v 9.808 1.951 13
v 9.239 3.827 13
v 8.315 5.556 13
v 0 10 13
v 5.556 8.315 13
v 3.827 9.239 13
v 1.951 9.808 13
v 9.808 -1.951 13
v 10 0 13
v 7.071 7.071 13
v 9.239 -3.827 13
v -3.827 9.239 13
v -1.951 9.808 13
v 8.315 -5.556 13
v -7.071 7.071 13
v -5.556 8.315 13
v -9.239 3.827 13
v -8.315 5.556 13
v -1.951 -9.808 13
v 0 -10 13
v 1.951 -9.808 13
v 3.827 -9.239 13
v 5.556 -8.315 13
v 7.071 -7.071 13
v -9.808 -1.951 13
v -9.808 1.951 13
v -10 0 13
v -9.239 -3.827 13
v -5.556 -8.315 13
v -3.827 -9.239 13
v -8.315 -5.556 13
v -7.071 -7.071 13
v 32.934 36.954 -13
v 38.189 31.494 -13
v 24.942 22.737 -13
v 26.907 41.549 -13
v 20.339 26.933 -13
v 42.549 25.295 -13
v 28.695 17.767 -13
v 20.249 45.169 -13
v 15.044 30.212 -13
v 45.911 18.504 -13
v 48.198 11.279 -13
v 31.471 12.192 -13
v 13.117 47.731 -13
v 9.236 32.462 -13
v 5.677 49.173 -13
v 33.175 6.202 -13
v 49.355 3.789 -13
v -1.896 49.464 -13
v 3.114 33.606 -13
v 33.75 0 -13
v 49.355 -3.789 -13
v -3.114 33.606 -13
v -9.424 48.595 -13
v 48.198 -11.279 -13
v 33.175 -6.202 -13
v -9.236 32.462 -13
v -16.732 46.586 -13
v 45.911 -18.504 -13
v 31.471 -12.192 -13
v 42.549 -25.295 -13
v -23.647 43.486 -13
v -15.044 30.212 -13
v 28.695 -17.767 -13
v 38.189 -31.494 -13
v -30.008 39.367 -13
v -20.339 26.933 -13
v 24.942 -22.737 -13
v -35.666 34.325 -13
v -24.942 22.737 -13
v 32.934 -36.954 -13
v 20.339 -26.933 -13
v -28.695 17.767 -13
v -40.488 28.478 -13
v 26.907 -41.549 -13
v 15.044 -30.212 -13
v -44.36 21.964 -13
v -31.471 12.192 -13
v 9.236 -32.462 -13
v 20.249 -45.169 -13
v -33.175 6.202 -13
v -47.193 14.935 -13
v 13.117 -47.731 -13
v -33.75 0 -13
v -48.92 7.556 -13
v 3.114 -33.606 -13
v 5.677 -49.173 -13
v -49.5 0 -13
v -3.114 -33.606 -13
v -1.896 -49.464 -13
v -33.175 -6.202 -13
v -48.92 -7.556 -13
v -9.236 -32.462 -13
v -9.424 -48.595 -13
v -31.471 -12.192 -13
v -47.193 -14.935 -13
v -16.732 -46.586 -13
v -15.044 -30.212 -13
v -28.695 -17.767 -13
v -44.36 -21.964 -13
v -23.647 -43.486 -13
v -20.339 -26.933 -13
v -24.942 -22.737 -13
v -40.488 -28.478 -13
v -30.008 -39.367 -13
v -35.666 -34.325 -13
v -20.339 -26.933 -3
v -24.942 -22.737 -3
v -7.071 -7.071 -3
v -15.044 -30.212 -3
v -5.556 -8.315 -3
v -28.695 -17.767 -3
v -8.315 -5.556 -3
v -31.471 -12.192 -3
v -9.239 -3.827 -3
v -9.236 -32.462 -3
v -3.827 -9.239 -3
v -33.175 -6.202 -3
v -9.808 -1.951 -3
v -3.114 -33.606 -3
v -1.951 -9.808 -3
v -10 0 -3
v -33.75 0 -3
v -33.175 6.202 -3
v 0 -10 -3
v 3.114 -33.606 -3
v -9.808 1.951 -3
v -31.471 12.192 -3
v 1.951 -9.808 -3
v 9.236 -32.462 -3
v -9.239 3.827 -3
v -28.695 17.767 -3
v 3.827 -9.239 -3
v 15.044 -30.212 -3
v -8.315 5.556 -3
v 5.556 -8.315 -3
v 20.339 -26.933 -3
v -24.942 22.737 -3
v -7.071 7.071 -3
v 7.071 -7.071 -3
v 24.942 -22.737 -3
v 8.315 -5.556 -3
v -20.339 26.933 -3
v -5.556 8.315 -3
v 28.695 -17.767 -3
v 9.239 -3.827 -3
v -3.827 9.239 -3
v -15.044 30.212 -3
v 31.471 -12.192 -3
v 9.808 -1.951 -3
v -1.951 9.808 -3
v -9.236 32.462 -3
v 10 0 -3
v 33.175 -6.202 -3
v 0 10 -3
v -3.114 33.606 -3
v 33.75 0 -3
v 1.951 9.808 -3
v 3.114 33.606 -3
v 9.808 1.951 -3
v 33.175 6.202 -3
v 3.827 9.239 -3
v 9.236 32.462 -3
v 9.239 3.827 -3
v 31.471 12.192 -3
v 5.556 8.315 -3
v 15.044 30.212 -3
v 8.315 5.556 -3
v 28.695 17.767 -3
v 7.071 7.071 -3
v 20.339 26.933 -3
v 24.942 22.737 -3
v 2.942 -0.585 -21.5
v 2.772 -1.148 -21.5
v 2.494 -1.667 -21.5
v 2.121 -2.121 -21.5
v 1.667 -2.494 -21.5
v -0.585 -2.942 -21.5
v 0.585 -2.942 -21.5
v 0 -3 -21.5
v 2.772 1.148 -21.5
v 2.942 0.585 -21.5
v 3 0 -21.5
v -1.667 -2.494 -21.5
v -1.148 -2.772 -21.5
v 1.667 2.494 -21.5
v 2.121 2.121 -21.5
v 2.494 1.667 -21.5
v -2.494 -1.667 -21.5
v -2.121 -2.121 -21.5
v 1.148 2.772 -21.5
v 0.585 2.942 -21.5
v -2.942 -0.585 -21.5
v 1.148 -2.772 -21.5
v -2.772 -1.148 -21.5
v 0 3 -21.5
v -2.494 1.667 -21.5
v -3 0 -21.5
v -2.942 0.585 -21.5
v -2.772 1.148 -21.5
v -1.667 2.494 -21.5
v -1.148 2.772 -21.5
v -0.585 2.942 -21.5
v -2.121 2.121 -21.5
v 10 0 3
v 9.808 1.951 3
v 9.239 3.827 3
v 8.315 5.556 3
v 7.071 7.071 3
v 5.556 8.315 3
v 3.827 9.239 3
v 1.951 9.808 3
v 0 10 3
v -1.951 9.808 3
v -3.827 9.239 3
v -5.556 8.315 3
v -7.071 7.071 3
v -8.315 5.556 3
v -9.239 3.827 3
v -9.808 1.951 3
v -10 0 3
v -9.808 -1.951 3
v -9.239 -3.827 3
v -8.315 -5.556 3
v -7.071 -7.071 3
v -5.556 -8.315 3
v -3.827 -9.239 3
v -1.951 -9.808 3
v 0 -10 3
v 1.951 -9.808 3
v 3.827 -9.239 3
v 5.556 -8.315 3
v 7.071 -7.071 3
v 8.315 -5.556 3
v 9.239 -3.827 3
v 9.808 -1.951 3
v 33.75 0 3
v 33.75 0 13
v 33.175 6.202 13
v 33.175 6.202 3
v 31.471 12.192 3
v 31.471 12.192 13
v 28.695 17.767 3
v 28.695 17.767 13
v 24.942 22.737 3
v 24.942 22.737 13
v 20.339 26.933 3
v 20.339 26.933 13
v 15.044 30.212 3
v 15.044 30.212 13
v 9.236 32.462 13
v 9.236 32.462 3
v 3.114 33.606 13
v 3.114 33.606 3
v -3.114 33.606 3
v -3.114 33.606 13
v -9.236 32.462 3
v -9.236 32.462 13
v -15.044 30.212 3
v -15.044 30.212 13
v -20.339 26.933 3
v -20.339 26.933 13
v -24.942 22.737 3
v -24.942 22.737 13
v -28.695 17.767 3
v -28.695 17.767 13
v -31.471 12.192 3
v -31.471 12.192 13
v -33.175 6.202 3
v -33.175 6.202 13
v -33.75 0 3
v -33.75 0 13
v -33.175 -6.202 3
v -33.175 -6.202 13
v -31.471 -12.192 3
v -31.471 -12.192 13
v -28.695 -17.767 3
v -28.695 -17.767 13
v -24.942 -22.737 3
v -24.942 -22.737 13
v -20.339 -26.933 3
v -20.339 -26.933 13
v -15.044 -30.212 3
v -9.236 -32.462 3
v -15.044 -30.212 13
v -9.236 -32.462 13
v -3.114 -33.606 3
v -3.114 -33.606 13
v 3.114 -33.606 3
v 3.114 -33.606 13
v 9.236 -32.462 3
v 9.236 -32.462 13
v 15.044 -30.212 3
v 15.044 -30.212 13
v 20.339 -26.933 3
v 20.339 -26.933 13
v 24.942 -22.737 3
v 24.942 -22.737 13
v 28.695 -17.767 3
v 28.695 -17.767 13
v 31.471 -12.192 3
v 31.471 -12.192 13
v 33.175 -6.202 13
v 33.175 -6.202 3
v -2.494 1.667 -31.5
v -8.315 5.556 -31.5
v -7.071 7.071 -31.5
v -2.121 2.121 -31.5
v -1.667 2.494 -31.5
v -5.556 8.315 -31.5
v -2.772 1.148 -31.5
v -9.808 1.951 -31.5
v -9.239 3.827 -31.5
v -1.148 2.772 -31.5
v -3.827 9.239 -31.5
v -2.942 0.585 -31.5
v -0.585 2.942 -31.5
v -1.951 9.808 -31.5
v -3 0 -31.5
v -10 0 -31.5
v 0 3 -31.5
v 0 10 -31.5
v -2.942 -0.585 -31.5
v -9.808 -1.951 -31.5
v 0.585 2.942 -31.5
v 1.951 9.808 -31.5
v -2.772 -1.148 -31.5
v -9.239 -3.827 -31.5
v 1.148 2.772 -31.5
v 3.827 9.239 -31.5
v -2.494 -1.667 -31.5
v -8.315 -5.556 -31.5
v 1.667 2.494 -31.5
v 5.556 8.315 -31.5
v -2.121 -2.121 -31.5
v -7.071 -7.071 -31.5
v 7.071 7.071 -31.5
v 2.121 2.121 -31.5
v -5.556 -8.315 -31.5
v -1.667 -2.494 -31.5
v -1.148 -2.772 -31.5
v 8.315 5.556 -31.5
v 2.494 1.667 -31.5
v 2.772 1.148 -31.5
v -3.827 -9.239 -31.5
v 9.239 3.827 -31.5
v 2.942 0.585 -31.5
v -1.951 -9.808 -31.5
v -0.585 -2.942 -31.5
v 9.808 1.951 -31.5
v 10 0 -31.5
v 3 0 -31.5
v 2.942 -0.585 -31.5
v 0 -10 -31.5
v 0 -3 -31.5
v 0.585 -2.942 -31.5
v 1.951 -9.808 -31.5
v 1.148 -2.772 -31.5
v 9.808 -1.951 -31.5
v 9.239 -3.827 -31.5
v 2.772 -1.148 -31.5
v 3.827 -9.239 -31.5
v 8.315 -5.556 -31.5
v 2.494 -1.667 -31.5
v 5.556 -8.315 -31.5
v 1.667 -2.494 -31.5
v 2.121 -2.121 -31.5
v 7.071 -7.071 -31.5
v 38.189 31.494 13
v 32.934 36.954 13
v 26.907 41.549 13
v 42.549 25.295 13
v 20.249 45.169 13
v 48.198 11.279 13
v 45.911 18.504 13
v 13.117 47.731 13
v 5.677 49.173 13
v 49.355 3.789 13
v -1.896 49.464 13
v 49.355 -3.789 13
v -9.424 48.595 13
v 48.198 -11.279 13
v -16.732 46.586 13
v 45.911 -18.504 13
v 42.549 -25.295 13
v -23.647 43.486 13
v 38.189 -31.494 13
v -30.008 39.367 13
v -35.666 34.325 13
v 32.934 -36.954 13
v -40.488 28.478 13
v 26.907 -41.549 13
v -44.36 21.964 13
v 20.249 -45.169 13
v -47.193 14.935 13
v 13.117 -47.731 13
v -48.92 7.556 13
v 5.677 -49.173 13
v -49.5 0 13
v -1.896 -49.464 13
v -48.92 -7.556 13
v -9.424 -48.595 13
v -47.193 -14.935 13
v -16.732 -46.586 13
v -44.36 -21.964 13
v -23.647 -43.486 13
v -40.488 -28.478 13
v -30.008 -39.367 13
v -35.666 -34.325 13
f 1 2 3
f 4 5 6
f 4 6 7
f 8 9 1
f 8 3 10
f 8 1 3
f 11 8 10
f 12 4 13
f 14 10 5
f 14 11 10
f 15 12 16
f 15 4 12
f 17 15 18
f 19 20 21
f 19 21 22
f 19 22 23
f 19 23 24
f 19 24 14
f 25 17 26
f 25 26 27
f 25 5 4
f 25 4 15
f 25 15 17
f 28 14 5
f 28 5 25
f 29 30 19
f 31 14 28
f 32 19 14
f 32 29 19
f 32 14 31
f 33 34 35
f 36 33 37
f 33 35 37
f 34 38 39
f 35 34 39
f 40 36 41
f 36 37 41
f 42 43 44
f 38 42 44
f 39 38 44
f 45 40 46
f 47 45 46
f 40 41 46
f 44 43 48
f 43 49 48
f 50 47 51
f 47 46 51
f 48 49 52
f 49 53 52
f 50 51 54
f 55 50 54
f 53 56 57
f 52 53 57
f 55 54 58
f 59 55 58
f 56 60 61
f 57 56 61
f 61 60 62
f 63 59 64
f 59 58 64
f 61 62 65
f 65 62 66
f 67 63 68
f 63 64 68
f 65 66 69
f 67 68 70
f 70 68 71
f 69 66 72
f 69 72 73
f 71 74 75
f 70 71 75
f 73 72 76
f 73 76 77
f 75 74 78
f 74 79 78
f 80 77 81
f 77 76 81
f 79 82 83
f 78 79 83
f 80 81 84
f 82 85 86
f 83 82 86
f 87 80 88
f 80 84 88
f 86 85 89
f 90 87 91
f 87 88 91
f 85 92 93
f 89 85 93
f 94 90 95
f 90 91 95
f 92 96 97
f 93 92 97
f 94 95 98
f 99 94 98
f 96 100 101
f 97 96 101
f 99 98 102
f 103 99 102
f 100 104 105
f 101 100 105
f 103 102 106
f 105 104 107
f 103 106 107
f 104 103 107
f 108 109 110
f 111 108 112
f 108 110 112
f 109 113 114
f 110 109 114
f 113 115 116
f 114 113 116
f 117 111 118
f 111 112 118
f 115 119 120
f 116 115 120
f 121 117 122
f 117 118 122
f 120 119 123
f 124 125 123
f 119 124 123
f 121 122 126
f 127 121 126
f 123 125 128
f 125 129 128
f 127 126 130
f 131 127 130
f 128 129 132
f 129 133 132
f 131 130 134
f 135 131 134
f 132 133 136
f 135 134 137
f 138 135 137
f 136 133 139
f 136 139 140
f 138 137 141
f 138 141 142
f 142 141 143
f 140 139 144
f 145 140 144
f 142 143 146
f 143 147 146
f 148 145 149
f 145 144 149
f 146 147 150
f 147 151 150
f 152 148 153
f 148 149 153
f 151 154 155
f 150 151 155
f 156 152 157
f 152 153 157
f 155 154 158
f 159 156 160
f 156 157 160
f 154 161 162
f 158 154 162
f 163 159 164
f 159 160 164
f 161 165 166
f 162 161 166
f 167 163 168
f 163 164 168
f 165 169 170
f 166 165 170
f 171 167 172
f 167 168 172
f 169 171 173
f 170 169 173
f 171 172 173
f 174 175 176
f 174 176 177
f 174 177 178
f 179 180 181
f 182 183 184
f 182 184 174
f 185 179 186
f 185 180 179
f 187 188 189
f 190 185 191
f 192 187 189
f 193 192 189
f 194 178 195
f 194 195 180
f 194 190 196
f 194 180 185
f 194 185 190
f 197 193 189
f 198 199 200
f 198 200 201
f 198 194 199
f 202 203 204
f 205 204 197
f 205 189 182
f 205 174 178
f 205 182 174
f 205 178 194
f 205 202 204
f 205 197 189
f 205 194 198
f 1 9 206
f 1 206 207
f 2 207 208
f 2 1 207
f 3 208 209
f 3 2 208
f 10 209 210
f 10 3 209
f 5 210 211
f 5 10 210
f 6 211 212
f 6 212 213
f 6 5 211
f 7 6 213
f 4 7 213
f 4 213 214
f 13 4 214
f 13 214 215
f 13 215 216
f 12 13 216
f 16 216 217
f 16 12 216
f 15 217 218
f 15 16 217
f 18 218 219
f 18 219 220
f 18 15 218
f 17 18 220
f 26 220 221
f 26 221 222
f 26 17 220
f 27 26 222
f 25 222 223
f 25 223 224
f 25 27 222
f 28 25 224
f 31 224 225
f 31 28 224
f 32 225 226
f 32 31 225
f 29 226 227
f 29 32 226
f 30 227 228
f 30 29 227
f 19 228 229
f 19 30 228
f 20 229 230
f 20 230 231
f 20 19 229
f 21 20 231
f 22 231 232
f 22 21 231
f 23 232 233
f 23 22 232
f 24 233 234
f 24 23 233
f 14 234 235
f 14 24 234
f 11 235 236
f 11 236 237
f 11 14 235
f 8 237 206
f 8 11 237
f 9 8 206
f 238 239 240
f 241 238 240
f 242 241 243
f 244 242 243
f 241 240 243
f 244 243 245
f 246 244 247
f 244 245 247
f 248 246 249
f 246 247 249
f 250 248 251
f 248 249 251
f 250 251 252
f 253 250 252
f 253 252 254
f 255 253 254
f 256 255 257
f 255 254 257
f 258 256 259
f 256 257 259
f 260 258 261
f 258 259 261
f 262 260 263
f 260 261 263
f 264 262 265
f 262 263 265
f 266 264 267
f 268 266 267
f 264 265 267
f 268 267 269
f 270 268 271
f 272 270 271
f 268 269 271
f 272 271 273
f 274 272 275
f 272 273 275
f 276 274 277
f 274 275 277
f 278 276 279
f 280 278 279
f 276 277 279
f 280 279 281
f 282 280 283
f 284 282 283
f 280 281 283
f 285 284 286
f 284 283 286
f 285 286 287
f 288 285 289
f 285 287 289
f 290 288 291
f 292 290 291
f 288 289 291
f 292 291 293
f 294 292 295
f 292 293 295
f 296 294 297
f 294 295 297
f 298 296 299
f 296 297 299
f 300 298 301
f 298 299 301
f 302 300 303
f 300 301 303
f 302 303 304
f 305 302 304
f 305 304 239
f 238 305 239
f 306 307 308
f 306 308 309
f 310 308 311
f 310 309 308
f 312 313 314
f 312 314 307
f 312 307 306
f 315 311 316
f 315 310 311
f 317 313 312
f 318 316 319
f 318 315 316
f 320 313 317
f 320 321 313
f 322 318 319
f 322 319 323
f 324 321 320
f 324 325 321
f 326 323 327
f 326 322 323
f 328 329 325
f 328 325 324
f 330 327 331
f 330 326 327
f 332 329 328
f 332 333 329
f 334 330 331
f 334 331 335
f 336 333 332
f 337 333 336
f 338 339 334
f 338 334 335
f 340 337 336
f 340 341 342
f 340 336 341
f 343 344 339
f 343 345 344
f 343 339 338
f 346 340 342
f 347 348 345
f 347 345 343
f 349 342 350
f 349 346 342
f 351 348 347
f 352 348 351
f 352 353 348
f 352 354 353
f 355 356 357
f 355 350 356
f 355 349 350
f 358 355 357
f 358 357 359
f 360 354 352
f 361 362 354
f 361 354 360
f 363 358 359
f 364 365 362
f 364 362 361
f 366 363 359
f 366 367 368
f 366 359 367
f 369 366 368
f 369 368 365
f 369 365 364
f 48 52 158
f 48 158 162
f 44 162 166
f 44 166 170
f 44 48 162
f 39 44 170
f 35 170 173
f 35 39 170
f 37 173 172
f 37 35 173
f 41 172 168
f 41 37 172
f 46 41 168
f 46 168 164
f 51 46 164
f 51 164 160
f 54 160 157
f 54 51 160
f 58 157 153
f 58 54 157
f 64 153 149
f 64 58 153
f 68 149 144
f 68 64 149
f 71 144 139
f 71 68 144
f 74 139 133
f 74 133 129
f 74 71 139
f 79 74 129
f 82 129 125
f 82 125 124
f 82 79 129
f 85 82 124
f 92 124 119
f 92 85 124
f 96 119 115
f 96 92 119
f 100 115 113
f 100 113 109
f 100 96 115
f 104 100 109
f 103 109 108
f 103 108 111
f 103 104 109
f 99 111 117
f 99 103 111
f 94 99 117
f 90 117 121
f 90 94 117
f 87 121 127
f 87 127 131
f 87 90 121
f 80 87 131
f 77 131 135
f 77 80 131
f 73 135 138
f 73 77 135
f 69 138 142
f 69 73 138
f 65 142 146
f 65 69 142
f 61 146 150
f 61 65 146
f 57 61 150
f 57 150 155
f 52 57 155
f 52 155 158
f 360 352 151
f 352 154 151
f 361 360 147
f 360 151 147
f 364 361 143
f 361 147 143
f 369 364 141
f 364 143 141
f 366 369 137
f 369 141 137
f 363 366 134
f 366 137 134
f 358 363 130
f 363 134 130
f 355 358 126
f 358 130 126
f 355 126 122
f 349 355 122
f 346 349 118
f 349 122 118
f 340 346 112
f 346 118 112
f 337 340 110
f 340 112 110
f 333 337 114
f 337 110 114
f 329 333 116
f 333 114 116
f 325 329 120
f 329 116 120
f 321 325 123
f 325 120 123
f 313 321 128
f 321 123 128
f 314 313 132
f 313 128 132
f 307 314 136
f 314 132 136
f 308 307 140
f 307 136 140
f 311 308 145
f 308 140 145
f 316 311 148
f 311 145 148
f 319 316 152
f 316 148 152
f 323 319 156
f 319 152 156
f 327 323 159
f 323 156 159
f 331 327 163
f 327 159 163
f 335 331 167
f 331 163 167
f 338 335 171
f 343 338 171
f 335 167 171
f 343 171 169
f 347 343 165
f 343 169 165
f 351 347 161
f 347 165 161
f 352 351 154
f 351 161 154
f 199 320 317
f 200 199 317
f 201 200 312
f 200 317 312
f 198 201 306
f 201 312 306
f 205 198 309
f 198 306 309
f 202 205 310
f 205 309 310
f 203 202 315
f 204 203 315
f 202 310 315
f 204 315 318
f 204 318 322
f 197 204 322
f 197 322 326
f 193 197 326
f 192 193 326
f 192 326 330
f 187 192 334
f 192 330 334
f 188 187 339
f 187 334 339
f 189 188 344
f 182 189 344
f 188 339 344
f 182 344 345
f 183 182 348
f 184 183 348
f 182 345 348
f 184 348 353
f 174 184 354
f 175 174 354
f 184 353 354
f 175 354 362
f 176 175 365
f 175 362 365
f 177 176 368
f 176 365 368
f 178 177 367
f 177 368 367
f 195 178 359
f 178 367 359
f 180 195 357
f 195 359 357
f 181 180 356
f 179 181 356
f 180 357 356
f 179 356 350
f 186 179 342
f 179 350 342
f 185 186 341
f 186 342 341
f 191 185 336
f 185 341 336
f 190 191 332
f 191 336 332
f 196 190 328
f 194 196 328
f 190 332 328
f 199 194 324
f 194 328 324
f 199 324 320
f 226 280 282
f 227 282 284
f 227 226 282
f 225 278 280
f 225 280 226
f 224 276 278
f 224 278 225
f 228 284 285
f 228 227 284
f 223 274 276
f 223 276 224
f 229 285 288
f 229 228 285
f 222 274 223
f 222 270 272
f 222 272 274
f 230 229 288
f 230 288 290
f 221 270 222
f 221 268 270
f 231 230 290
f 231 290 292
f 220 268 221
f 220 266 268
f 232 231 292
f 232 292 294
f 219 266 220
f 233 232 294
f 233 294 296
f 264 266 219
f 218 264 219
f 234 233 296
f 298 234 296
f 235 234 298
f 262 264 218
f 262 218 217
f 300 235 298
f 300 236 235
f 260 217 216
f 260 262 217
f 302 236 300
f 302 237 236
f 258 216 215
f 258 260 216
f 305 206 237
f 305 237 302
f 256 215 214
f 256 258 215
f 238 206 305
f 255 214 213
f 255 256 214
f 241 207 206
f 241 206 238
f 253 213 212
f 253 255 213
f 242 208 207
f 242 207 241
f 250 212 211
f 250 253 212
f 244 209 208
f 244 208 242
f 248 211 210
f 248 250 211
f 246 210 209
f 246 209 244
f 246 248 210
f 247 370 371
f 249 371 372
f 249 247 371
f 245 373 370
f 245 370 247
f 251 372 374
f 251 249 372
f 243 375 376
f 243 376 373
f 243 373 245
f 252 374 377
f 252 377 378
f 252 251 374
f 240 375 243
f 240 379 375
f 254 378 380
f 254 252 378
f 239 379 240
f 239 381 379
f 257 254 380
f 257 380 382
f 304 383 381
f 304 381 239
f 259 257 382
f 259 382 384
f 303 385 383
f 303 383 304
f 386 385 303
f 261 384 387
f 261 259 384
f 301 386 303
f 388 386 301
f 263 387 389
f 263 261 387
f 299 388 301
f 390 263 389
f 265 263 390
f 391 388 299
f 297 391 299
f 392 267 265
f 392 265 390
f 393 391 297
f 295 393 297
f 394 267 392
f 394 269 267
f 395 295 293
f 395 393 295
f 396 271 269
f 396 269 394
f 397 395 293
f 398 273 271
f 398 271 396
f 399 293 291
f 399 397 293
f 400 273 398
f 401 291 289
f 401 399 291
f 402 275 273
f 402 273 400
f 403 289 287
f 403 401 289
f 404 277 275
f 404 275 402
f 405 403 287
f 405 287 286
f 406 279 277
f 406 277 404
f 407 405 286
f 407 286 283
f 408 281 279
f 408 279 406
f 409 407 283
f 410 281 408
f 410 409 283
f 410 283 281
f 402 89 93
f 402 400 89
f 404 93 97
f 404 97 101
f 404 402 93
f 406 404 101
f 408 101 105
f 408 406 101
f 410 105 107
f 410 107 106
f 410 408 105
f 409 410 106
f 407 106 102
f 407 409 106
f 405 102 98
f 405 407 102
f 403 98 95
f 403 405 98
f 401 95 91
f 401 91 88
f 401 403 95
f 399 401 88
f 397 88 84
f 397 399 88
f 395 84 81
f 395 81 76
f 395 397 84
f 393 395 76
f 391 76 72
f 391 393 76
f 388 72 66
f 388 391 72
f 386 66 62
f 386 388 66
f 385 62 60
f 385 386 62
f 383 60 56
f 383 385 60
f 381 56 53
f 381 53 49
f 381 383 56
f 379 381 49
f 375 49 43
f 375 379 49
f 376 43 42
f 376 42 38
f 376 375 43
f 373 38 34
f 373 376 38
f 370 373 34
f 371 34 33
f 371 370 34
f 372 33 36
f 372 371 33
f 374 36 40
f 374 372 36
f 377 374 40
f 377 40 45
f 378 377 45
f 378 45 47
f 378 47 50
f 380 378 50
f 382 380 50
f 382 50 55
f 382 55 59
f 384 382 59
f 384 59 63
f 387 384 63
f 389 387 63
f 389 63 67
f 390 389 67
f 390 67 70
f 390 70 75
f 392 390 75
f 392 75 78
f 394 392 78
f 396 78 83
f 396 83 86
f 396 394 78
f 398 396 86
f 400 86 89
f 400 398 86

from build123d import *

# Parameters (mm, degrees)
ESQUISSE1_R             = 49.5
BOSS_EXTRU_2_DEPTH      = 13
ESQUISSE5_R             = 33.75
ESQUISSE5_R_2           = 10
ENL_V_MAT_EXTRU_1_DEPTH = 10
ESQUISSE12_R            = 10
BOSS_EXTRU_3_DEPTH      = 18.5
ESQUISSE13_R            = 3
ENL_V_MAT_EXTRU_2_DEPTH = 10


with BuildPart() as part:
    # Esquisse1 → Boss.-Extru.2 (new body)
    with BuildSketch(Plane.XY):
        with Locations(Location((0, 0, 0), (0, 0, 180))):
            Circle(ESQUISSE1_R)
    extrude(amount=BOSS_EXTRU_2_DEPTH)

    # Esquisse5 → Enlèv. mat.-Extru.1 (cut)
    with BuildSketch(Plane.XY.offset(13)):
        Circle(ESQUISSE5_R)
        Circle(ESQUISSE5_R_2, mode=Mode.SUBTRACT)
    extrude(amount=-ENL_V_MAT_EXTRU_1_DEPTH, mode=Mode.SUBTRACT)

    # Symétrie6: part across plane


with BuildPart() as part_1:
    add(part.part)
    add(part.part.mirror(Plane.XY))

    # Esquisse12 → Boss.-Extru.3 (add)
    with BuildSketch(Plane(origin=(0, 0, -13), x_dir=(-1, 0, 0), z_dir=(0, 0, -1))):
        with Locations(Location((0, 0, 0), (0, 0, 180))):
            Circle(ESQUISSE12_R)
    extrude(amount=BOSS_EXTRU_3_DEPTH)

    # Esquisse13 → Enlèv. mat.-Extru.2 (cut)
    with BuildSketch(Plane(origin=(0, 0, -31.5), x_dir=(-1, 0, 0), z_dir=(0, 0, -1))):
        Circle(ESQUISSE13_R)
    extrude(amount=-ENL_V_MAT_EXTRU_2_DEPTH, mode=Mode.SUBTRACT)


solid = part_1.part
